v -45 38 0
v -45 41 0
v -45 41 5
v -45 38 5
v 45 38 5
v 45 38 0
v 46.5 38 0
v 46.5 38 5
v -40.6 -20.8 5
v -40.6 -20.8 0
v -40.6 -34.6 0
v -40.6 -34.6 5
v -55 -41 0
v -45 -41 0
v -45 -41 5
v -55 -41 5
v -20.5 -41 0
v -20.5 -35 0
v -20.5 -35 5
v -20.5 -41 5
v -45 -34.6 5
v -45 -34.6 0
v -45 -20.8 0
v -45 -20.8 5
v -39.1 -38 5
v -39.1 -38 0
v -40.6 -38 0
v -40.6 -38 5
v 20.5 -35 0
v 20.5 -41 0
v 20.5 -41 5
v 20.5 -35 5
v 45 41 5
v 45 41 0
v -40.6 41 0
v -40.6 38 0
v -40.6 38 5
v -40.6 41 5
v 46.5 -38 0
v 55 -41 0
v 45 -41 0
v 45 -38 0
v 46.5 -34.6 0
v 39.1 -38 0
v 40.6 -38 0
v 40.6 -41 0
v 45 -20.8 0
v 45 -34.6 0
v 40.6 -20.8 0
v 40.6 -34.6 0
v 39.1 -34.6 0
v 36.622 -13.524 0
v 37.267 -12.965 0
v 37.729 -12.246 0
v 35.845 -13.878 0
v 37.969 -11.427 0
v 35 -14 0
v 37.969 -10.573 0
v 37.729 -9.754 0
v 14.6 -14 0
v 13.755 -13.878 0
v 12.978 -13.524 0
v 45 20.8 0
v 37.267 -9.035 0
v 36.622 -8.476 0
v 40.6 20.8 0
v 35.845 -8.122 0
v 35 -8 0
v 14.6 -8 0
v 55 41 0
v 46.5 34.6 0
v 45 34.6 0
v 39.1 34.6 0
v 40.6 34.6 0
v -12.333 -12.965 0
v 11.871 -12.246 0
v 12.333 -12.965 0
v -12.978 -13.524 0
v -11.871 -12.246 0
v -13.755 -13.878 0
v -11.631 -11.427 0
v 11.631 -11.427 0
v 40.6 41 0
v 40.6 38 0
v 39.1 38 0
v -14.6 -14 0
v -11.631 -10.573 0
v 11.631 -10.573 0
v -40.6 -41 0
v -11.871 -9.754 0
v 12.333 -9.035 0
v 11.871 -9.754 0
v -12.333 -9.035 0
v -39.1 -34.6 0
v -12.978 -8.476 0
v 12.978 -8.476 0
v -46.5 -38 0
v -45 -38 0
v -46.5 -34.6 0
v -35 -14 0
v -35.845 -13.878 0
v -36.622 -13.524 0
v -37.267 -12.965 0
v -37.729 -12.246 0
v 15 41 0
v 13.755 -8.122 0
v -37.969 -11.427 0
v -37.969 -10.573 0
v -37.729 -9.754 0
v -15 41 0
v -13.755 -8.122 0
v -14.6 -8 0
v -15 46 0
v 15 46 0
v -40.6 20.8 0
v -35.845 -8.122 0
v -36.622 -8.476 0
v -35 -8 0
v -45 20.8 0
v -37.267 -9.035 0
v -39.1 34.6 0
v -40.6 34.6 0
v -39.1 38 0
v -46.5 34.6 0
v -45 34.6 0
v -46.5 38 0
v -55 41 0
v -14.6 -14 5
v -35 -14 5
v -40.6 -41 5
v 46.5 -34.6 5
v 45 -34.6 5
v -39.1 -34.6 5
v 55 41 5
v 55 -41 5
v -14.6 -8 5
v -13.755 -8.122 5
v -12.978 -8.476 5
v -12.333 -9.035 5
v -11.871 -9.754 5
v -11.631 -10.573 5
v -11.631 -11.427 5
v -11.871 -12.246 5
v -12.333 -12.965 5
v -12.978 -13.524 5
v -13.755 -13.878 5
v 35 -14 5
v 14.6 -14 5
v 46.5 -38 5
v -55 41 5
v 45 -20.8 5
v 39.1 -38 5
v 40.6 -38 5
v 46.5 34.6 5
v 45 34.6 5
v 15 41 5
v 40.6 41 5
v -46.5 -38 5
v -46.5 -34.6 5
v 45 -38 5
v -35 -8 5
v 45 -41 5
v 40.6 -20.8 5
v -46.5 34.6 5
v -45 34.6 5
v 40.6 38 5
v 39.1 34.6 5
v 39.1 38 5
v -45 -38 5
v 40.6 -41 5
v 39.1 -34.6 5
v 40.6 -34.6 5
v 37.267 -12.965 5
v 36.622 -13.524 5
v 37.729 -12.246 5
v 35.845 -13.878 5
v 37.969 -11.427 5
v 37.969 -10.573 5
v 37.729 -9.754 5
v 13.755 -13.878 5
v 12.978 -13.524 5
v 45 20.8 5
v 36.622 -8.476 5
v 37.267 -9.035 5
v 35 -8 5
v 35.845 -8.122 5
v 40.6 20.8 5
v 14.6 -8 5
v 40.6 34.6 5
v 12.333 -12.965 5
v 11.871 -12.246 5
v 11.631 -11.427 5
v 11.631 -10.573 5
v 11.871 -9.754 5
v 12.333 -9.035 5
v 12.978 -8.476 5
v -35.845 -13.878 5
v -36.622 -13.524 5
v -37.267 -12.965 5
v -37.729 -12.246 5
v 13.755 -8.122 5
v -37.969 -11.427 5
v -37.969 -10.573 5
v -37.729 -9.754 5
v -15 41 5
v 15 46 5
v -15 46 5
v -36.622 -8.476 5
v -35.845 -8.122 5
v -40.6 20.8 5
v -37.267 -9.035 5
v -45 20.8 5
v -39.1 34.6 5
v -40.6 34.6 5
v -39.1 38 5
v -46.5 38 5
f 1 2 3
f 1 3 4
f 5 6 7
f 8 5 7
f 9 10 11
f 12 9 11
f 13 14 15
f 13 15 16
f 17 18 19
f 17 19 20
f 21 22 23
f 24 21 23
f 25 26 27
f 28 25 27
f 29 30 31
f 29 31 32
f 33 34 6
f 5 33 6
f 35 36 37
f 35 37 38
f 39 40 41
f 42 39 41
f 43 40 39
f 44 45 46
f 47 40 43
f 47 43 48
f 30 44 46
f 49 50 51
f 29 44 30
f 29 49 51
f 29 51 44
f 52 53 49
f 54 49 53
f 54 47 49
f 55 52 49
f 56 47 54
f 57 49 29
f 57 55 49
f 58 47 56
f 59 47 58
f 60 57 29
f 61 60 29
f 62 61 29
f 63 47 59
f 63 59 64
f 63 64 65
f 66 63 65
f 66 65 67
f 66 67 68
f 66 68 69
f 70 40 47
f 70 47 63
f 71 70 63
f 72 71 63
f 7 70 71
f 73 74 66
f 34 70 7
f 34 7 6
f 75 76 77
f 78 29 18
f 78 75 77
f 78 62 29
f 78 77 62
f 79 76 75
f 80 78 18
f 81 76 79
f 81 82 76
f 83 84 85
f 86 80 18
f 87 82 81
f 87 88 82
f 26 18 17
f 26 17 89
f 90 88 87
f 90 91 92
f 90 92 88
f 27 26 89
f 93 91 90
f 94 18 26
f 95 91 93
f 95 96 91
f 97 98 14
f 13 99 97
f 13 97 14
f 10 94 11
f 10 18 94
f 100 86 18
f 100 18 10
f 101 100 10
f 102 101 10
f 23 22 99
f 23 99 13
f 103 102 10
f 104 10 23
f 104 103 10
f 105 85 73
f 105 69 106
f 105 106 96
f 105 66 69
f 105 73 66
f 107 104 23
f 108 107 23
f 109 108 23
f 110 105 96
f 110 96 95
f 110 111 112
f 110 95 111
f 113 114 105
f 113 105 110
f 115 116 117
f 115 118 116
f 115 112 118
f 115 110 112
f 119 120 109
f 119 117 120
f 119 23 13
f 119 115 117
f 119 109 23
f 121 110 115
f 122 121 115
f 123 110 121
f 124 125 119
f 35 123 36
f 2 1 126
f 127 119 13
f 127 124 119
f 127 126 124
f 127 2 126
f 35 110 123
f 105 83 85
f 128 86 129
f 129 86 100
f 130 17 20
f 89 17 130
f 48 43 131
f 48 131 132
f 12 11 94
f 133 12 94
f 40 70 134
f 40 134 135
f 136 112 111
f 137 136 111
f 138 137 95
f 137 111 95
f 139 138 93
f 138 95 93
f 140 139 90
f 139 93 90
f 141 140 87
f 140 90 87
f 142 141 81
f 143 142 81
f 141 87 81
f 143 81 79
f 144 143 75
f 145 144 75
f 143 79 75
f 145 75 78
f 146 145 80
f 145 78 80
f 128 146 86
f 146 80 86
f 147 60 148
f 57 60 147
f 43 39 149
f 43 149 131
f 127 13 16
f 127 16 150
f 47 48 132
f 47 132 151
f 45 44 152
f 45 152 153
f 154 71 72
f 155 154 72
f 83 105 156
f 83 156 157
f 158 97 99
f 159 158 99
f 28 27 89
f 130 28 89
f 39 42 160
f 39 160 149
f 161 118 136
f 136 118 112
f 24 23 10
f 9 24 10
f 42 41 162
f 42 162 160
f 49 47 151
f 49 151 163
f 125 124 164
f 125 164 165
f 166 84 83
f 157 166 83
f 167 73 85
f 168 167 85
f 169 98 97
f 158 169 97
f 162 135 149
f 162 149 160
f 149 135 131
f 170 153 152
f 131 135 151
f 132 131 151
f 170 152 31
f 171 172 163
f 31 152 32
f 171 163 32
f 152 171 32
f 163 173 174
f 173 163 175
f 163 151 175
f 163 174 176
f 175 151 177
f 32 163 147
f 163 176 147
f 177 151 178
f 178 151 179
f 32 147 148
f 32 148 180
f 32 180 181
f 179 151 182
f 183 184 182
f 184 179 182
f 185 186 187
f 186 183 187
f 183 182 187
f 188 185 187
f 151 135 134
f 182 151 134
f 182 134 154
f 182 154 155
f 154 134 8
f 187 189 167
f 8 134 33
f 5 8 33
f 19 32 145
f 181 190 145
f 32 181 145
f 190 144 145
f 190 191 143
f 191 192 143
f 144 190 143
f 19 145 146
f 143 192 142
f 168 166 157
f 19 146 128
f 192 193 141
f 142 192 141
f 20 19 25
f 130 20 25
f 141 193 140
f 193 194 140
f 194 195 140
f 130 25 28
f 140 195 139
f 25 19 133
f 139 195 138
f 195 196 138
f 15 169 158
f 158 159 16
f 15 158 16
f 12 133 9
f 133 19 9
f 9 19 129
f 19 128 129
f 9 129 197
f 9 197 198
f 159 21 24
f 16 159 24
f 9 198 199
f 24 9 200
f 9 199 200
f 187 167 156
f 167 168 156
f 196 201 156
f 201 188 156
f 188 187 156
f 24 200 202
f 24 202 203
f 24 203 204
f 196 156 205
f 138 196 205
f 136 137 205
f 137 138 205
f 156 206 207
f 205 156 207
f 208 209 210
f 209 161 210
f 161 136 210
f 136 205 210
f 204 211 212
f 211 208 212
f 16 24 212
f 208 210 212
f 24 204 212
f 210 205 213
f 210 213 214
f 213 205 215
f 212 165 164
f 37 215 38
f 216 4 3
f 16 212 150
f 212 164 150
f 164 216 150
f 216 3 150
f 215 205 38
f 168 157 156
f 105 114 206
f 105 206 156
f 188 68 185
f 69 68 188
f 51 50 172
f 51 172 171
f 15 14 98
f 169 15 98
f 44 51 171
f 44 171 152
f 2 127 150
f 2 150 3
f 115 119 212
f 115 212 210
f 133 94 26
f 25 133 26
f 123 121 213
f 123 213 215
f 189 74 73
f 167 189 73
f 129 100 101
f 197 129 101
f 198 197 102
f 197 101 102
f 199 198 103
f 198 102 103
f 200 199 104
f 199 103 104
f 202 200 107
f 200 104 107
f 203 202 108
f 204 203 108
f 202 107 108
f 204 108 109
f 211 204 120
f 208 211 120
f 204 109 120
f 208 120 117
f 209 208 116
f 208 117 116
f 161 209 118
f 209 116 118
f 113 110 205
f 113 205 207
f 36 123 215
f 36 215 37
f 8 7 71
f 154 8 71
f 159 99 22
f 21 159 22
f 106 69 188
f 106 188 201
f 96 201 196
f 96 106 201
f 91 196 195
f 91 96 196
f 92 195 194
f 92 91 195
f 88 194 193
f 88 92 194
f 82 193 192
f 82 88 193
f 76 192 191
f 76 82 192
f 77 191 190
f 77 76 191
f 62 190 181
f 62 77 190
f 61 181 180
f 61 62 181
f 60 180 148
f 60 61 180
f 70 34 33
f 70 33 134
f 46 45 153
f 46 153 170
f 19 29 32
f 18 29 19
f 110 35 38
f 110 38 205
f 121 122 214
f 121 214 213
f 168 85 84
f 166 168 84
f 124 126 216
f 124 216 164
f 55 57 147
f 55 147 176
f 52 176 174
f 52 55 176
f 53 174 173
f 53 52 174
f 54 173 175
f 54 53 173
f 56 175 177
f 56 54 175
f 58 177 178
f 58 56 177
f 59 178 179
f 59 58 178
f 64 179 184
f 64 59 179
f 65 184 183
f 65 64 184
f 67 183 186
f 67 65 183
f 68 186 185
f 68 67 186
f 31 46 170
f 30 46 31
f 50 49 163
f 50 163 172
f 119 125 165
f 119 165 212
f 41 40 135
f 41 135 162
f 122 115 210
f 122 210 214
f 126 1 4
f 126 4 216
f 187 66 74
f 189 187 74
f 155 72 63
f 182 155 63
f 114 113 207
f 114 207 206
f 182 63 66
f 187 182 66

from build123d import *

# Parameters (mm, degrees)
BOSS_EXTRUDE1_DEPTH = 5
CUT_EXTRUDE1_DEPTH  = 5
CUT_EXTRUDE2_DEPTH  = 10


with BuildPart() as part:
    # Sketch1 → Boss-Extrude1 (new body)
    with BuildSketch(Plane.XY):
        Polygon((20.5, -41), (20.5, -35), (-20.5, -35), (-20.5, -41), (-55, -41), (-55, 41), (-15, 41), (-15, 46), (15, 46), (15, 41), (55, 41), (55, -41), align=None)
    extrude(amount=BOSS_EXTRUDE1_DEPTH)

    # Sketch2 → Cut-Extrude1 (cut)
    with BuildSketch(Plane(origin=(0, 0, 0), x_dir=(-1, 0, 0), z_dir=(0, 0, -1))):
        Polygon((-40.6, -38), (-40.6, -41), (-45, -41), (-45, -38), (-46.5, -38), (-46.5, -34.6), (-45, -34.6), (-45, -20.8), (-40.6, -20.8), (-40.6, -34.6), (-39.1, -34.6), (-39.1, -38), align=None)
        Polygon((45, -41), (45, -38), (46.5, -38), (46.5, -34.6), (45, -34.6), (45, -20.8), (40.6, -20.8), (40.6, -34.6), (39.1, -34.6), (39.1, -38), (40.6, -38), (40.6, -41), align=None)
        Polygon((40.6, 38), (40.6, 41), (45, 41), (45, 38), (46.5, 38), (46.5, 34.6), (45, 34.6), (45, 20.8), (40.6, 20.8), (40.6, 34.6), (39.1, 34.6), (39.1, 38), align=None)
        Polygon((-45, 41), (-45, 38), (-46.5, 38), (-46.5, 34.6), (-45, 34.6), (-45, 20.8), (-40.6, 20.8), (-40.6, 34.6), (-39.1, 34.6), (-39.1, 38), (-40.6, 38), (-40.6, 41), align=None)
    extrude(amount=-CUT_EXTRUDE1_DEPTH, mode=Mode.SUBTRACT)

    # Sketch3 → Cut-Extrude2 (cut)
    with BuildSketch(Plane(origin=(0, 0, 0), x_dir=(-1, 0, 0), z_dir=(0, 0, -1))):
        with BuildLine():
            Line((-14.6, -14), (-35, -14))
            ThreePointArc((-35, -14), (-38, -11), (-35, -8))
            Line((-35, -8), (-14.6, -8))
            ThreePointArc((-14.6, -8), (-11.6, -11), (-14.6, -14))
        make_face()
        with BuildLine():
            Line((14.6, -14), (35, -14))
            ThreePointArc((35, -14), (38, -11), (35, -8))
            Line((35, -8), (14.6, -8))
            ThreePointArc((14.6, -8), (11.6, -11), (14.6, -14))
        make_face()
    extrude(amount=-CUT_EXTRUDE2_DEPTH, mode=Mode.SUBTRACT)


solid = part.part
